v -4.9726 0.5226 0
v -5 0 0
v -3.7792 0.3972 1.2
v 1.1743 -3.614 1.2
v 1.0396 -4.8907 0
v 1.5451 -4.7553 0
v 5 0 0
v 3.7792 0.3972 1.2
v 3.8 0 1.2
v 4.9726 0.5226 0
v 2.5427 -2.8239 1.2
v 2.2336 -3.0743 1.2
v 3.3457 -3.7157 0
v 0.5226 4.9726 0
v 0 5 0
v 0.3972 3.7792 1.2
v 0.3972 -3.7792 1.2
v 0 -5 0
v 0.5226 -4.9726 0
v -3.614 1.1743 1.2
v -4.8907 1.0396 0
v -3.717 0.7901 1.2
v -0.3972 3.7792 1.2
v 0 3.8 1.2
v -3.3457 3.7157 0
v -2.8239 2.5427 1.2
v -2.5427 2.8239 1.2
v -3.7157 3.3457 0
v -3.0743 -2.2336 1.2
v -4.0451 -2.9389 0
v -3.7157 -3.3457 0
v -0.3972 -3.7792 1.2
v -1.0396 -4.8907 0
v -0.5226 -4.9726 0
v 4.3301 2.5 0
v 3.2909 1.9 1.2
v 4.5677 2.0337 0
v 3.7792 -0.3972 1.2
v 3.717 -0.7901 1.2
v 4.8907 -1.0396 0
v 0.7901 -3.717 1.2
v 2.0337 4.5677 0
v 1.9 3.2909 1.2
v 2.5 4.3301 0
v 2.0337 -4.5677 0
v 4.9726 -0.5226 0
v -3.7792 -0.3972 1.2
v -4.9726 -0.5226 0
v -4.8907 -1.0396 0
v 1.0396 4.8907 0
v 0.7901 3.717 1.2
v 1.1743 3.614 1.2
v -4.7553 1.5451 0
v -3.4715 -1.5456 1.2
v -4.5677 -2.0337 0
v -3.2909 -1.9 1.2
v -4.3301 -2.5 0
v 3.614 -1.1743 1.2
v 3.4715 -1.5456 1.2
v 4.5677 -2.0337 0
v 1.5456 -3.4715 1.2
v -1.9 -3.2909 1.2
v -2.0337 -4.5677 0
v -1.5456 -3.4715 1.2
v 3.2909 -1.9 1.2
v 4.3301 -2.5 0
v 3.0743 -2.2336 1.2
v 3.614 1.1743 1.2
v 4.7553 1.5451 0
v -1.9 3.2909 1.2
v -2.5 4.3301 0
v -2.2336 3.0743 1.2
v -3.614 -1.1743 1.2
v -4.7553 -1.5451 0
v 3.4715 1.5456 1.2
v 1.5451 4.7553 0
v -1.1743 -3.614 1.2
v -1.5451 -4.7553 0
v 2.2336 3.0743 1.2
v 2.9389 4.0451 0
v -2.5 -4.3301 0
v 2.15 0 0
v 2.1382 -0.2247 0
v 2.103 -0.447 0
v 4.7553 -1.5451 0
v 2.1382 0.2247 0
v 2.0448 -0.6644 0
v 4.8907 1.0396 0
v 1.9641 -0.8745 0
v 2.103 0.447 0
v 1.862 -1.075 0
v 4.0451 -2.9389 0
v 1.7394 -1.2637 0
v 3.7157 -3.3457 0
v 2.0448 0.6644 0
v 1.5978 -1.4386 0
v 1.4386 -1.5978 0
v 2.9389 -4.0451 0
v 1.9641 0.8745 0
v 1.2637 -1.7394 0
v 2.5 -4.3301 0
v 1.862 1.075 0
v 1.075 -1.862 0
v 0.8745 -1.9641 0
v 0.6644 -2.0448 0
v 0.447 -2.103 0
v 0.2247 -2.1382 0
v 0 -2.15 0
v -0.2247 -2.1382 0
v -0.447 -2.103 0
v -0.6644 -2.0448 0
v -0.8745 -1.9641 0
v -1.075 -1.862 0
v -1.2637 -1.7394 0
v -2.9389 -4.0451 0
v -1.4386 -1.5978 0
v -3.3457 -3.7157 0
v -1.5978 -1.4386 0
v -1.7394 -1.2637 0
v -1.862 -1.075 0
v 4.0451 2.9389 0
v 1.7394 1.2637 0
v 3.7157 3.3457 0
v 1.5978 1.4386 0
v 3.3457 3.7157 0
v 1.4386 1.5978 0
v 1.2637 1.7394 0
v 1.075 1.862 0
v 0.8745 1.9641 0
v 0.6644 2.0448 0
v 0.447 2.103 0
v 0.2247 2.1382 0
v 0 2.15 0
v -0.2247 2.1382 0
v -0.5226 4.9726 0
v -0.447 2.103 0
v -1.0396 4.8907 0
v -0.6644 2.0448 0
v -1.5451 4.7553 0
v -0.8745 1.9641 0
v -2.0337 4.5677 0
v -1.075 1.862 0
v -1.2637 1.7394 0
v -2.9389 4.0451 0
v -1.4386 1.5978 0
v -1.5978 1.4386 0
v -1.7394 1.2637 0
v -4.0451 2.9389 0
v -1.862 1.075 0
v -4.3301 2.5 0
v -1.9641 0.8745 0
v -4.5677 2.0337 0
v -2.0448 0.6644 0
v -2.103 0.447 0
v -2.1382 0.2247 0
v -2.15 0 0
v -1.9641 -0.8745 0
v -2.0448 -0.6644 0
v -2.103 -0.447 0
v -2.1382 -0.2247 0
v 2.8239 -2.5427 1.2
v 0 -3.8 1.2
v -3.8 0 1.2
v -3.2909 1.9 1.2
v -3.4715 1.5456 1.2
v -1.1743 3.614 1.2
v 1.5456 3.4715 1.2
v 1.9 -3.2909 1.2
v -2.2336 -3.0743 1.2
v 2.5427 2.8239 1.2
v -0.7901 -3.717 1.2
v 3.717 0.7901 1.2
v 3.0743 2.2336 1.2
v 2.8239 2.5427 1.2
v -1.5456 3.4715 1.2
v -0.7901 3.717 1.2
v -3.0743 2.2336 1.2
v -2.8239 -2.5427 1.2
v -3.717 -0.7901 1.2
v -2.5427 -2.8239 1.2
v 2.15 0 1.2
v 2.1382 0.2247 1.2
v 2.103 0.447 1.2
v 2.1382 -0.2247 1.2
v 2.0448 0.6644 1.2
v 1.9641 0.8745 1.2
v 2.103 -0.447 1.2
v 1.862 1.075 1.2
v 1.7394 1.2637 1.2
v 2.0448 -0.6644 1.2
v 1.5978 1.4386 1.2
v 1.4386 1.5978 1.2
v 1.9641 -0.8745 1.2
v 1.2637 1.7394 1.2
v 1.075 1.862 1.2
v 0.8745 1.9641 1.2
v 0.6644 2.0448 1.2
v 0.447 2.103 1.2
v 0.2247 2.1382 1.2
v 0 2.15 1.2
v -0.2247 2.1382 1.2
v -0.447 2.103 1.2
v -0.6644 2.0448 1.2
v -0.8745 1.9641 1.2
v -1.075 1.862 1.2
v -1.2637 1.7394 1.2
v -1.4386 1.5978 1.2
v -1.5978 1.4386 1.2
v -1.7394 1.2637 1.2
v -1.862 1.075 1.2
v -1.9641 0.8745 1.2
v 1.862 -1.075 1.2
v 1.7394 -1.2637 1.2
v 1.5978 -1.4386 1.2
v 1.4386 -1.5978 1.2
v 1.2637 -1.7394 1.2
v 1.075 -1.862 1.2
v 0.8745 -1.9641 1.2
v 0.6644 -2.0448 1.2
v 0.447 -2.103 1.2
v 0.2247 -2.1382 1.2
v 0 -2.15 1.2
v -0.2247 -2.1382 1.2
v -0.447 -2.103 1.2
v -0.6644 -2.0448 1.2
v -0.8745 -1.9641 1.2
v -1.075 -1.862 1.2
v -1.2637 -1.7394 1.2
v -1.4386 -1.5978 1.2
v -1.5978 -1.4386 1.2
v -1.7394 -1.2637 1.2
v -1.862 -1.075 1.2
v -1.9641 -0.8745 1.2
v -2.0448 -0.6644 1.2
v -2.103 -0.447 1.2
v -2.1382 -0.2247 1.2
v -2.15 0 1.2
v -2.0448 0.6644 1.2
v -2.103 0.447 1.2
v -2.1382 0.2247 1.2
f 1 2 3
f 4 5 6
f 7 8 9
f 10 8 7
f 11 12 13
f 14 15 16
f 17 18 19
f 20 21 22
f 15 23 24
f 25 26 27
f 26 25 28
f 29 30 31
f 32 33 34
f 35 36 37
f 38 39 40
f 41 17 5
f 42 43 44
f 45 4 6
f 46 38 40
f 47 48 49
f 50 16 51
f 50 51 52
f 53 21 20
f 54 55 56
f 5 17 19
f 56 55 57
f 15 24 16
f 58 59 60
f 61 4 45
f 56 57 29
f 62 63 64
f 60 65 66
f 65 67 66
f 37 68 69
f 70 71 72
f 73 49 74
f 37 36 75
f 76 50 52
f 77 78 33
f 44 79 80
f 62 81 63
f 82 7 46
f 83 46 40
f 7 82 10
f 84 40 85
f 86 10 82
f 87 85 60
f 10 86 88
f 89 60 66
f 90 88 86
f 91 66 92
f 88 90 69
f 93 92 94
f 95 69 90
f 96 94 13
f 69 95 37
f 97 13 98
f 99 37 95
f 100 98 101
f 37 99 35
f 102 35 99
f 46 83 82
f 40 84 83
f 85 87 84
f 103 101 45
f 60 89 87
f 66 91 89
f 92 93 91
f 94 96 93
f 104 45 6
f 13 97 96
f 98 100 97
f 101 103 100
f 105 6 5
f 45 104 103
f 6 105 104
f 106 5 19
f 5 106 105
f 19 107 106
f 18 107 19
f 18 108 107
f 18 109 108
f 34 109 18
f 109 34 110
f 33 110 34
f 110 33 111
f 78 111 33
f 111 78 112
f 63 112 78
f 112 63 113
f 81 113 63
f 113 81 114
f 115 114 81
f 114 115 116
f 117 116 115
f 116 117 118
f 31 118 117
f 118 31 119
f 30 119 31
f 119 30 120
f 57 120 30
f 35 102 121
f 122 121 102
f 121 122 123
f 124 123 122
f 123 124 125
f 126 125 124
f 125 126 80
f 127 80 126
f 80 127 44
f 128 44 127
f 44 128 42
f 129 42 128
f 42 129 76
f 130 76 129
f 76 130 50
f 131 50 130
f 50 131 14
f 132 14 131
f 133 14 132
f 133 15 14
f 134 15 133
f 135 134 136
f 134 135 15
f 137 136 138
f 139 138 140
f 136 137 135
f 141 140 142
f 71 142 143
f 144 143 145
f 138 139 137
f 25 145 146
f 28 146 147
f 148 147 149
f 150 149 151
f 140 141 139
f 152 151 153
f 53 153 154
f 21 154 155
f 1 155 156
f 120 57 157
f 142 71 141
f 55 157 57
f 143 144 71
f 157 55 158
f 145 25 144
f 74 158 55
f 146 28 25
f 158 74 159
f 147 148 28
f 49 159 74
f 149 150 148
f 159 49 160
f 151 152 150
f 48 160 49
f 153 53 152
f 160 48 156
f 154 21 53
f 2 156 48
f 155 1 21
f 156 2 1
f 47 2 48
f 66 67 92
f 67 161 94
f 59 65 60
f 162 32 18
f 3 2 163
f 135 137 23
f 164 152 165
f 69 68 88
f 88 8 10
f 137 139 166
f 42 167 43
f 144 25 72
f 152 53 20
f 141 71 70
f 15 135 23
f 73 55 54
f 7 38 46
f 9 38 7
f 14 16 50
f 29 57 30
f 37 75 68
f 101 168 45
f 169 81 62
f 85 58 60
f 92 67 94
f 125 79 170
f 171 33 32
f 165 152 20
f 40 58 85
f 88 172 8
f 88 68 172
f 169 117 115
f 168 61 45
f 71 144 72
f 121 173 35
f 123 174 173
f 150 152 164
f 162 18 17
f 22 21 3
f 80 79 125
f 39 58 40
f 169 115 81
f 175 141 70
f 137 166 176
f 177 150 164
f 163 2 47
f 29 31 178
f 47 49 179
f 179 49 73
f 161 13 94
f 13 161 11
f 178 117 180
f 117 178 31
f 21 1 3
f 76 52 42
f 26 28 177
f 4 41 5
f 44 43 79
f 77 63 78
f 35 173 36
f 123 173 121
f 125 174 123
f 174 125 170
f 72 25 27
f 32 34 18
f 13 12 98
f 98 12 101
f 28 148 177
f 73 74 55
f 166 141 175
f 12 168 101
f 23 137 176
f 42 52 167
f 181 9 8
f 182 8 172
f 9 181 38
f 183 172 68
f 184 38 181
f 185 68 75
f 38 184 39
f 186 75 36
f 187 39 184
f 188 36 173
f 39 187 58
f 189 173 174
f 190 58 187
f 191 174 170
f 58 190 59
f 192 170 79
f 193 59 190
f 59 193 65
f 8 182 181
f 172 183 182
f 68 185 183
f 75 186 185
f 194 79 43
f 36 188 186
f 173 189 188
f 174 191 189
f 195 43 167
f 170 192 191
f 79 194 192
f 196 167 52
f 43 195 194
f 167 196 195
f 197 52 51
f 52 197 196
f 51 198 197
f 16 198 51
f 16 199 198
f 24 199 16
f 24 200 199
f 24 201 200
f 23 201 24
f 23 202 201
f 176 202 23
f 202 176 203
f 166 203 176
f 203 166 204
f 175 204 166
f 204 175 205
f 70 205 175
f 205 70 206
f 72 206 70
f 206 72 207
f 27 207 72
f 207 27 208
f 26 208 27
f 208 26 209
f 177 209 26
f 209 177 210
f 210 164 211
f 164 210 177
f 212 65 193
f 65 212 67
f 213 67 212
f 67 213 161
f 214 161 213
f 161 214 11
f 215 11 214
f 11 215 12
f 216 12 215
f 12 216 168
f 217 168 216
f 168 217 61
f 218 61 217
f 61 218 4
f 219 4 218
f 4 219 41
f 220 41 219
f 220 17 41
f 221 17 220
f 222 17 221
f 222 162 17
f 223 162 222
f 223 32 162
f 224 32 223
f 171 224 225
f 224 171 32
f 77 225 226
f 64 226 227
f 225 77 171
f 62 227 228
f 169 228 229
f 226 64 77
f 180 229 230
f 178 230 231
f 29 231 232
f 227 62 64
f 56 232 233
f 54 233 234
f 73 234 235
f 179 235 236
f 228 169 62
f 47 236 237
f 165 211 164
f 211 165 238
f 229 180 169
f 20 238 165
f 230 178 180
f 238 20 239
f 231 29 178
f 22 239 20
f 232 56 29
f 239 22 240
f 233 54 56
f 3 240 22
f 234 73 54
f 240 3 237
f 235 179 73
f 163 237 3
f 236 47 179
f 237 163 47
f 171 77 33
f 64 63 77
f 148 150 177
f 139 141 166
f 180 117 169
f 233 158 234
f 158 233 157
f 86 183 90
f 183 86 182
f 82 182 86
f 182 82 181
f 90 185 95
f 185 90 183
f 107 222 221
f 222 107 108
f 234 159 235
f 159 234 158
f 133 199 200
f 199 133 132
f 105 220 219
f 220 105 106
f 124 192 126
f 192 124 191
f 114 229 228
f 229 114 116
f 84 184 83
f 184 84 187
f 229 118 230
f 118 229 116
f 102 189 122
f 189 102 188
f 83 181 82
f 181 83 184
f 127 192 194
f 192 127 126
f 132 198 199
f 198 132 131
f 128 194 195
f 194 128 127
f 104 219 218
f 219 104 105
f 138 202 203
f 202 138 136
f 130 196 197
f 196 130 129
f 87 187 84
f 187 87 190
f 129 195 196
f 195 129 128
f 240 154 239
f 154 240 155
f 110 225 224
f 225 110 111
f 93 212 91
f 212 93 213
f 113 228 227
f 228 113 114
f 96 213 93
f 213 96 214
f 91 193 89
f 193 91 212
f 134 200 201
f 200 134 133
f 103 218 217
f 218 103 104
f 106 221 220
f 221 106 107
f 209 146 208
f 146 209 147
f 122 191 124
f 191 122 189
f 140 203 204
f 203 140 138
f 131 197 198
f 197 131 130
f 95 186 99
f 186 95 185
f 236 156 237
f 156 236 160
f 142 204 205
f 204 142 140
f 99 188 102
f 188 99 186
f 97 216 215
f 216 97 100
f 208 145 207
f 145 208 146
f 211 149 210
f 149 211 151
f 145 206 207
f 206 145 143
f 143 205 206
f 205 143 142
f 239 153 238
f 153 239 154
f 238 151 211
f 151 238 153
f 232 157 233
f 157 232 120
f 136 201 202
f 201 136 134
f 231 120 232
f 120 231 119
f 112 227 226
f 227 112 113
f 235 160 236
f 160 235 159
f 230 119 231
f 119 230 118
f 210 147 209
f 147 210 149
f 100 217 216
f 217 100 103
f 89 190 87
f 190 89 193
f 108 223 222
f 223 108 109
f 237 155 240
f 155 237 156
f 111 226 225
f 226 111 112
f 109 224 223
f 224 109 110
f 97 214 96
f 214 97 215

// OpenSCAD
// Conical spring washer.
$fn = 60;
eps = 0.02;
inner_d = 4.3;
outer_d = 10;
thickness = 1.2;
difference() {
    cylinder(d1=outer_d,d2=outer_d-2*thickness,h=thickness);
    translate([0,0,-eps]) cylinder(d=inner_d,h=thickness+2*eps);
}
